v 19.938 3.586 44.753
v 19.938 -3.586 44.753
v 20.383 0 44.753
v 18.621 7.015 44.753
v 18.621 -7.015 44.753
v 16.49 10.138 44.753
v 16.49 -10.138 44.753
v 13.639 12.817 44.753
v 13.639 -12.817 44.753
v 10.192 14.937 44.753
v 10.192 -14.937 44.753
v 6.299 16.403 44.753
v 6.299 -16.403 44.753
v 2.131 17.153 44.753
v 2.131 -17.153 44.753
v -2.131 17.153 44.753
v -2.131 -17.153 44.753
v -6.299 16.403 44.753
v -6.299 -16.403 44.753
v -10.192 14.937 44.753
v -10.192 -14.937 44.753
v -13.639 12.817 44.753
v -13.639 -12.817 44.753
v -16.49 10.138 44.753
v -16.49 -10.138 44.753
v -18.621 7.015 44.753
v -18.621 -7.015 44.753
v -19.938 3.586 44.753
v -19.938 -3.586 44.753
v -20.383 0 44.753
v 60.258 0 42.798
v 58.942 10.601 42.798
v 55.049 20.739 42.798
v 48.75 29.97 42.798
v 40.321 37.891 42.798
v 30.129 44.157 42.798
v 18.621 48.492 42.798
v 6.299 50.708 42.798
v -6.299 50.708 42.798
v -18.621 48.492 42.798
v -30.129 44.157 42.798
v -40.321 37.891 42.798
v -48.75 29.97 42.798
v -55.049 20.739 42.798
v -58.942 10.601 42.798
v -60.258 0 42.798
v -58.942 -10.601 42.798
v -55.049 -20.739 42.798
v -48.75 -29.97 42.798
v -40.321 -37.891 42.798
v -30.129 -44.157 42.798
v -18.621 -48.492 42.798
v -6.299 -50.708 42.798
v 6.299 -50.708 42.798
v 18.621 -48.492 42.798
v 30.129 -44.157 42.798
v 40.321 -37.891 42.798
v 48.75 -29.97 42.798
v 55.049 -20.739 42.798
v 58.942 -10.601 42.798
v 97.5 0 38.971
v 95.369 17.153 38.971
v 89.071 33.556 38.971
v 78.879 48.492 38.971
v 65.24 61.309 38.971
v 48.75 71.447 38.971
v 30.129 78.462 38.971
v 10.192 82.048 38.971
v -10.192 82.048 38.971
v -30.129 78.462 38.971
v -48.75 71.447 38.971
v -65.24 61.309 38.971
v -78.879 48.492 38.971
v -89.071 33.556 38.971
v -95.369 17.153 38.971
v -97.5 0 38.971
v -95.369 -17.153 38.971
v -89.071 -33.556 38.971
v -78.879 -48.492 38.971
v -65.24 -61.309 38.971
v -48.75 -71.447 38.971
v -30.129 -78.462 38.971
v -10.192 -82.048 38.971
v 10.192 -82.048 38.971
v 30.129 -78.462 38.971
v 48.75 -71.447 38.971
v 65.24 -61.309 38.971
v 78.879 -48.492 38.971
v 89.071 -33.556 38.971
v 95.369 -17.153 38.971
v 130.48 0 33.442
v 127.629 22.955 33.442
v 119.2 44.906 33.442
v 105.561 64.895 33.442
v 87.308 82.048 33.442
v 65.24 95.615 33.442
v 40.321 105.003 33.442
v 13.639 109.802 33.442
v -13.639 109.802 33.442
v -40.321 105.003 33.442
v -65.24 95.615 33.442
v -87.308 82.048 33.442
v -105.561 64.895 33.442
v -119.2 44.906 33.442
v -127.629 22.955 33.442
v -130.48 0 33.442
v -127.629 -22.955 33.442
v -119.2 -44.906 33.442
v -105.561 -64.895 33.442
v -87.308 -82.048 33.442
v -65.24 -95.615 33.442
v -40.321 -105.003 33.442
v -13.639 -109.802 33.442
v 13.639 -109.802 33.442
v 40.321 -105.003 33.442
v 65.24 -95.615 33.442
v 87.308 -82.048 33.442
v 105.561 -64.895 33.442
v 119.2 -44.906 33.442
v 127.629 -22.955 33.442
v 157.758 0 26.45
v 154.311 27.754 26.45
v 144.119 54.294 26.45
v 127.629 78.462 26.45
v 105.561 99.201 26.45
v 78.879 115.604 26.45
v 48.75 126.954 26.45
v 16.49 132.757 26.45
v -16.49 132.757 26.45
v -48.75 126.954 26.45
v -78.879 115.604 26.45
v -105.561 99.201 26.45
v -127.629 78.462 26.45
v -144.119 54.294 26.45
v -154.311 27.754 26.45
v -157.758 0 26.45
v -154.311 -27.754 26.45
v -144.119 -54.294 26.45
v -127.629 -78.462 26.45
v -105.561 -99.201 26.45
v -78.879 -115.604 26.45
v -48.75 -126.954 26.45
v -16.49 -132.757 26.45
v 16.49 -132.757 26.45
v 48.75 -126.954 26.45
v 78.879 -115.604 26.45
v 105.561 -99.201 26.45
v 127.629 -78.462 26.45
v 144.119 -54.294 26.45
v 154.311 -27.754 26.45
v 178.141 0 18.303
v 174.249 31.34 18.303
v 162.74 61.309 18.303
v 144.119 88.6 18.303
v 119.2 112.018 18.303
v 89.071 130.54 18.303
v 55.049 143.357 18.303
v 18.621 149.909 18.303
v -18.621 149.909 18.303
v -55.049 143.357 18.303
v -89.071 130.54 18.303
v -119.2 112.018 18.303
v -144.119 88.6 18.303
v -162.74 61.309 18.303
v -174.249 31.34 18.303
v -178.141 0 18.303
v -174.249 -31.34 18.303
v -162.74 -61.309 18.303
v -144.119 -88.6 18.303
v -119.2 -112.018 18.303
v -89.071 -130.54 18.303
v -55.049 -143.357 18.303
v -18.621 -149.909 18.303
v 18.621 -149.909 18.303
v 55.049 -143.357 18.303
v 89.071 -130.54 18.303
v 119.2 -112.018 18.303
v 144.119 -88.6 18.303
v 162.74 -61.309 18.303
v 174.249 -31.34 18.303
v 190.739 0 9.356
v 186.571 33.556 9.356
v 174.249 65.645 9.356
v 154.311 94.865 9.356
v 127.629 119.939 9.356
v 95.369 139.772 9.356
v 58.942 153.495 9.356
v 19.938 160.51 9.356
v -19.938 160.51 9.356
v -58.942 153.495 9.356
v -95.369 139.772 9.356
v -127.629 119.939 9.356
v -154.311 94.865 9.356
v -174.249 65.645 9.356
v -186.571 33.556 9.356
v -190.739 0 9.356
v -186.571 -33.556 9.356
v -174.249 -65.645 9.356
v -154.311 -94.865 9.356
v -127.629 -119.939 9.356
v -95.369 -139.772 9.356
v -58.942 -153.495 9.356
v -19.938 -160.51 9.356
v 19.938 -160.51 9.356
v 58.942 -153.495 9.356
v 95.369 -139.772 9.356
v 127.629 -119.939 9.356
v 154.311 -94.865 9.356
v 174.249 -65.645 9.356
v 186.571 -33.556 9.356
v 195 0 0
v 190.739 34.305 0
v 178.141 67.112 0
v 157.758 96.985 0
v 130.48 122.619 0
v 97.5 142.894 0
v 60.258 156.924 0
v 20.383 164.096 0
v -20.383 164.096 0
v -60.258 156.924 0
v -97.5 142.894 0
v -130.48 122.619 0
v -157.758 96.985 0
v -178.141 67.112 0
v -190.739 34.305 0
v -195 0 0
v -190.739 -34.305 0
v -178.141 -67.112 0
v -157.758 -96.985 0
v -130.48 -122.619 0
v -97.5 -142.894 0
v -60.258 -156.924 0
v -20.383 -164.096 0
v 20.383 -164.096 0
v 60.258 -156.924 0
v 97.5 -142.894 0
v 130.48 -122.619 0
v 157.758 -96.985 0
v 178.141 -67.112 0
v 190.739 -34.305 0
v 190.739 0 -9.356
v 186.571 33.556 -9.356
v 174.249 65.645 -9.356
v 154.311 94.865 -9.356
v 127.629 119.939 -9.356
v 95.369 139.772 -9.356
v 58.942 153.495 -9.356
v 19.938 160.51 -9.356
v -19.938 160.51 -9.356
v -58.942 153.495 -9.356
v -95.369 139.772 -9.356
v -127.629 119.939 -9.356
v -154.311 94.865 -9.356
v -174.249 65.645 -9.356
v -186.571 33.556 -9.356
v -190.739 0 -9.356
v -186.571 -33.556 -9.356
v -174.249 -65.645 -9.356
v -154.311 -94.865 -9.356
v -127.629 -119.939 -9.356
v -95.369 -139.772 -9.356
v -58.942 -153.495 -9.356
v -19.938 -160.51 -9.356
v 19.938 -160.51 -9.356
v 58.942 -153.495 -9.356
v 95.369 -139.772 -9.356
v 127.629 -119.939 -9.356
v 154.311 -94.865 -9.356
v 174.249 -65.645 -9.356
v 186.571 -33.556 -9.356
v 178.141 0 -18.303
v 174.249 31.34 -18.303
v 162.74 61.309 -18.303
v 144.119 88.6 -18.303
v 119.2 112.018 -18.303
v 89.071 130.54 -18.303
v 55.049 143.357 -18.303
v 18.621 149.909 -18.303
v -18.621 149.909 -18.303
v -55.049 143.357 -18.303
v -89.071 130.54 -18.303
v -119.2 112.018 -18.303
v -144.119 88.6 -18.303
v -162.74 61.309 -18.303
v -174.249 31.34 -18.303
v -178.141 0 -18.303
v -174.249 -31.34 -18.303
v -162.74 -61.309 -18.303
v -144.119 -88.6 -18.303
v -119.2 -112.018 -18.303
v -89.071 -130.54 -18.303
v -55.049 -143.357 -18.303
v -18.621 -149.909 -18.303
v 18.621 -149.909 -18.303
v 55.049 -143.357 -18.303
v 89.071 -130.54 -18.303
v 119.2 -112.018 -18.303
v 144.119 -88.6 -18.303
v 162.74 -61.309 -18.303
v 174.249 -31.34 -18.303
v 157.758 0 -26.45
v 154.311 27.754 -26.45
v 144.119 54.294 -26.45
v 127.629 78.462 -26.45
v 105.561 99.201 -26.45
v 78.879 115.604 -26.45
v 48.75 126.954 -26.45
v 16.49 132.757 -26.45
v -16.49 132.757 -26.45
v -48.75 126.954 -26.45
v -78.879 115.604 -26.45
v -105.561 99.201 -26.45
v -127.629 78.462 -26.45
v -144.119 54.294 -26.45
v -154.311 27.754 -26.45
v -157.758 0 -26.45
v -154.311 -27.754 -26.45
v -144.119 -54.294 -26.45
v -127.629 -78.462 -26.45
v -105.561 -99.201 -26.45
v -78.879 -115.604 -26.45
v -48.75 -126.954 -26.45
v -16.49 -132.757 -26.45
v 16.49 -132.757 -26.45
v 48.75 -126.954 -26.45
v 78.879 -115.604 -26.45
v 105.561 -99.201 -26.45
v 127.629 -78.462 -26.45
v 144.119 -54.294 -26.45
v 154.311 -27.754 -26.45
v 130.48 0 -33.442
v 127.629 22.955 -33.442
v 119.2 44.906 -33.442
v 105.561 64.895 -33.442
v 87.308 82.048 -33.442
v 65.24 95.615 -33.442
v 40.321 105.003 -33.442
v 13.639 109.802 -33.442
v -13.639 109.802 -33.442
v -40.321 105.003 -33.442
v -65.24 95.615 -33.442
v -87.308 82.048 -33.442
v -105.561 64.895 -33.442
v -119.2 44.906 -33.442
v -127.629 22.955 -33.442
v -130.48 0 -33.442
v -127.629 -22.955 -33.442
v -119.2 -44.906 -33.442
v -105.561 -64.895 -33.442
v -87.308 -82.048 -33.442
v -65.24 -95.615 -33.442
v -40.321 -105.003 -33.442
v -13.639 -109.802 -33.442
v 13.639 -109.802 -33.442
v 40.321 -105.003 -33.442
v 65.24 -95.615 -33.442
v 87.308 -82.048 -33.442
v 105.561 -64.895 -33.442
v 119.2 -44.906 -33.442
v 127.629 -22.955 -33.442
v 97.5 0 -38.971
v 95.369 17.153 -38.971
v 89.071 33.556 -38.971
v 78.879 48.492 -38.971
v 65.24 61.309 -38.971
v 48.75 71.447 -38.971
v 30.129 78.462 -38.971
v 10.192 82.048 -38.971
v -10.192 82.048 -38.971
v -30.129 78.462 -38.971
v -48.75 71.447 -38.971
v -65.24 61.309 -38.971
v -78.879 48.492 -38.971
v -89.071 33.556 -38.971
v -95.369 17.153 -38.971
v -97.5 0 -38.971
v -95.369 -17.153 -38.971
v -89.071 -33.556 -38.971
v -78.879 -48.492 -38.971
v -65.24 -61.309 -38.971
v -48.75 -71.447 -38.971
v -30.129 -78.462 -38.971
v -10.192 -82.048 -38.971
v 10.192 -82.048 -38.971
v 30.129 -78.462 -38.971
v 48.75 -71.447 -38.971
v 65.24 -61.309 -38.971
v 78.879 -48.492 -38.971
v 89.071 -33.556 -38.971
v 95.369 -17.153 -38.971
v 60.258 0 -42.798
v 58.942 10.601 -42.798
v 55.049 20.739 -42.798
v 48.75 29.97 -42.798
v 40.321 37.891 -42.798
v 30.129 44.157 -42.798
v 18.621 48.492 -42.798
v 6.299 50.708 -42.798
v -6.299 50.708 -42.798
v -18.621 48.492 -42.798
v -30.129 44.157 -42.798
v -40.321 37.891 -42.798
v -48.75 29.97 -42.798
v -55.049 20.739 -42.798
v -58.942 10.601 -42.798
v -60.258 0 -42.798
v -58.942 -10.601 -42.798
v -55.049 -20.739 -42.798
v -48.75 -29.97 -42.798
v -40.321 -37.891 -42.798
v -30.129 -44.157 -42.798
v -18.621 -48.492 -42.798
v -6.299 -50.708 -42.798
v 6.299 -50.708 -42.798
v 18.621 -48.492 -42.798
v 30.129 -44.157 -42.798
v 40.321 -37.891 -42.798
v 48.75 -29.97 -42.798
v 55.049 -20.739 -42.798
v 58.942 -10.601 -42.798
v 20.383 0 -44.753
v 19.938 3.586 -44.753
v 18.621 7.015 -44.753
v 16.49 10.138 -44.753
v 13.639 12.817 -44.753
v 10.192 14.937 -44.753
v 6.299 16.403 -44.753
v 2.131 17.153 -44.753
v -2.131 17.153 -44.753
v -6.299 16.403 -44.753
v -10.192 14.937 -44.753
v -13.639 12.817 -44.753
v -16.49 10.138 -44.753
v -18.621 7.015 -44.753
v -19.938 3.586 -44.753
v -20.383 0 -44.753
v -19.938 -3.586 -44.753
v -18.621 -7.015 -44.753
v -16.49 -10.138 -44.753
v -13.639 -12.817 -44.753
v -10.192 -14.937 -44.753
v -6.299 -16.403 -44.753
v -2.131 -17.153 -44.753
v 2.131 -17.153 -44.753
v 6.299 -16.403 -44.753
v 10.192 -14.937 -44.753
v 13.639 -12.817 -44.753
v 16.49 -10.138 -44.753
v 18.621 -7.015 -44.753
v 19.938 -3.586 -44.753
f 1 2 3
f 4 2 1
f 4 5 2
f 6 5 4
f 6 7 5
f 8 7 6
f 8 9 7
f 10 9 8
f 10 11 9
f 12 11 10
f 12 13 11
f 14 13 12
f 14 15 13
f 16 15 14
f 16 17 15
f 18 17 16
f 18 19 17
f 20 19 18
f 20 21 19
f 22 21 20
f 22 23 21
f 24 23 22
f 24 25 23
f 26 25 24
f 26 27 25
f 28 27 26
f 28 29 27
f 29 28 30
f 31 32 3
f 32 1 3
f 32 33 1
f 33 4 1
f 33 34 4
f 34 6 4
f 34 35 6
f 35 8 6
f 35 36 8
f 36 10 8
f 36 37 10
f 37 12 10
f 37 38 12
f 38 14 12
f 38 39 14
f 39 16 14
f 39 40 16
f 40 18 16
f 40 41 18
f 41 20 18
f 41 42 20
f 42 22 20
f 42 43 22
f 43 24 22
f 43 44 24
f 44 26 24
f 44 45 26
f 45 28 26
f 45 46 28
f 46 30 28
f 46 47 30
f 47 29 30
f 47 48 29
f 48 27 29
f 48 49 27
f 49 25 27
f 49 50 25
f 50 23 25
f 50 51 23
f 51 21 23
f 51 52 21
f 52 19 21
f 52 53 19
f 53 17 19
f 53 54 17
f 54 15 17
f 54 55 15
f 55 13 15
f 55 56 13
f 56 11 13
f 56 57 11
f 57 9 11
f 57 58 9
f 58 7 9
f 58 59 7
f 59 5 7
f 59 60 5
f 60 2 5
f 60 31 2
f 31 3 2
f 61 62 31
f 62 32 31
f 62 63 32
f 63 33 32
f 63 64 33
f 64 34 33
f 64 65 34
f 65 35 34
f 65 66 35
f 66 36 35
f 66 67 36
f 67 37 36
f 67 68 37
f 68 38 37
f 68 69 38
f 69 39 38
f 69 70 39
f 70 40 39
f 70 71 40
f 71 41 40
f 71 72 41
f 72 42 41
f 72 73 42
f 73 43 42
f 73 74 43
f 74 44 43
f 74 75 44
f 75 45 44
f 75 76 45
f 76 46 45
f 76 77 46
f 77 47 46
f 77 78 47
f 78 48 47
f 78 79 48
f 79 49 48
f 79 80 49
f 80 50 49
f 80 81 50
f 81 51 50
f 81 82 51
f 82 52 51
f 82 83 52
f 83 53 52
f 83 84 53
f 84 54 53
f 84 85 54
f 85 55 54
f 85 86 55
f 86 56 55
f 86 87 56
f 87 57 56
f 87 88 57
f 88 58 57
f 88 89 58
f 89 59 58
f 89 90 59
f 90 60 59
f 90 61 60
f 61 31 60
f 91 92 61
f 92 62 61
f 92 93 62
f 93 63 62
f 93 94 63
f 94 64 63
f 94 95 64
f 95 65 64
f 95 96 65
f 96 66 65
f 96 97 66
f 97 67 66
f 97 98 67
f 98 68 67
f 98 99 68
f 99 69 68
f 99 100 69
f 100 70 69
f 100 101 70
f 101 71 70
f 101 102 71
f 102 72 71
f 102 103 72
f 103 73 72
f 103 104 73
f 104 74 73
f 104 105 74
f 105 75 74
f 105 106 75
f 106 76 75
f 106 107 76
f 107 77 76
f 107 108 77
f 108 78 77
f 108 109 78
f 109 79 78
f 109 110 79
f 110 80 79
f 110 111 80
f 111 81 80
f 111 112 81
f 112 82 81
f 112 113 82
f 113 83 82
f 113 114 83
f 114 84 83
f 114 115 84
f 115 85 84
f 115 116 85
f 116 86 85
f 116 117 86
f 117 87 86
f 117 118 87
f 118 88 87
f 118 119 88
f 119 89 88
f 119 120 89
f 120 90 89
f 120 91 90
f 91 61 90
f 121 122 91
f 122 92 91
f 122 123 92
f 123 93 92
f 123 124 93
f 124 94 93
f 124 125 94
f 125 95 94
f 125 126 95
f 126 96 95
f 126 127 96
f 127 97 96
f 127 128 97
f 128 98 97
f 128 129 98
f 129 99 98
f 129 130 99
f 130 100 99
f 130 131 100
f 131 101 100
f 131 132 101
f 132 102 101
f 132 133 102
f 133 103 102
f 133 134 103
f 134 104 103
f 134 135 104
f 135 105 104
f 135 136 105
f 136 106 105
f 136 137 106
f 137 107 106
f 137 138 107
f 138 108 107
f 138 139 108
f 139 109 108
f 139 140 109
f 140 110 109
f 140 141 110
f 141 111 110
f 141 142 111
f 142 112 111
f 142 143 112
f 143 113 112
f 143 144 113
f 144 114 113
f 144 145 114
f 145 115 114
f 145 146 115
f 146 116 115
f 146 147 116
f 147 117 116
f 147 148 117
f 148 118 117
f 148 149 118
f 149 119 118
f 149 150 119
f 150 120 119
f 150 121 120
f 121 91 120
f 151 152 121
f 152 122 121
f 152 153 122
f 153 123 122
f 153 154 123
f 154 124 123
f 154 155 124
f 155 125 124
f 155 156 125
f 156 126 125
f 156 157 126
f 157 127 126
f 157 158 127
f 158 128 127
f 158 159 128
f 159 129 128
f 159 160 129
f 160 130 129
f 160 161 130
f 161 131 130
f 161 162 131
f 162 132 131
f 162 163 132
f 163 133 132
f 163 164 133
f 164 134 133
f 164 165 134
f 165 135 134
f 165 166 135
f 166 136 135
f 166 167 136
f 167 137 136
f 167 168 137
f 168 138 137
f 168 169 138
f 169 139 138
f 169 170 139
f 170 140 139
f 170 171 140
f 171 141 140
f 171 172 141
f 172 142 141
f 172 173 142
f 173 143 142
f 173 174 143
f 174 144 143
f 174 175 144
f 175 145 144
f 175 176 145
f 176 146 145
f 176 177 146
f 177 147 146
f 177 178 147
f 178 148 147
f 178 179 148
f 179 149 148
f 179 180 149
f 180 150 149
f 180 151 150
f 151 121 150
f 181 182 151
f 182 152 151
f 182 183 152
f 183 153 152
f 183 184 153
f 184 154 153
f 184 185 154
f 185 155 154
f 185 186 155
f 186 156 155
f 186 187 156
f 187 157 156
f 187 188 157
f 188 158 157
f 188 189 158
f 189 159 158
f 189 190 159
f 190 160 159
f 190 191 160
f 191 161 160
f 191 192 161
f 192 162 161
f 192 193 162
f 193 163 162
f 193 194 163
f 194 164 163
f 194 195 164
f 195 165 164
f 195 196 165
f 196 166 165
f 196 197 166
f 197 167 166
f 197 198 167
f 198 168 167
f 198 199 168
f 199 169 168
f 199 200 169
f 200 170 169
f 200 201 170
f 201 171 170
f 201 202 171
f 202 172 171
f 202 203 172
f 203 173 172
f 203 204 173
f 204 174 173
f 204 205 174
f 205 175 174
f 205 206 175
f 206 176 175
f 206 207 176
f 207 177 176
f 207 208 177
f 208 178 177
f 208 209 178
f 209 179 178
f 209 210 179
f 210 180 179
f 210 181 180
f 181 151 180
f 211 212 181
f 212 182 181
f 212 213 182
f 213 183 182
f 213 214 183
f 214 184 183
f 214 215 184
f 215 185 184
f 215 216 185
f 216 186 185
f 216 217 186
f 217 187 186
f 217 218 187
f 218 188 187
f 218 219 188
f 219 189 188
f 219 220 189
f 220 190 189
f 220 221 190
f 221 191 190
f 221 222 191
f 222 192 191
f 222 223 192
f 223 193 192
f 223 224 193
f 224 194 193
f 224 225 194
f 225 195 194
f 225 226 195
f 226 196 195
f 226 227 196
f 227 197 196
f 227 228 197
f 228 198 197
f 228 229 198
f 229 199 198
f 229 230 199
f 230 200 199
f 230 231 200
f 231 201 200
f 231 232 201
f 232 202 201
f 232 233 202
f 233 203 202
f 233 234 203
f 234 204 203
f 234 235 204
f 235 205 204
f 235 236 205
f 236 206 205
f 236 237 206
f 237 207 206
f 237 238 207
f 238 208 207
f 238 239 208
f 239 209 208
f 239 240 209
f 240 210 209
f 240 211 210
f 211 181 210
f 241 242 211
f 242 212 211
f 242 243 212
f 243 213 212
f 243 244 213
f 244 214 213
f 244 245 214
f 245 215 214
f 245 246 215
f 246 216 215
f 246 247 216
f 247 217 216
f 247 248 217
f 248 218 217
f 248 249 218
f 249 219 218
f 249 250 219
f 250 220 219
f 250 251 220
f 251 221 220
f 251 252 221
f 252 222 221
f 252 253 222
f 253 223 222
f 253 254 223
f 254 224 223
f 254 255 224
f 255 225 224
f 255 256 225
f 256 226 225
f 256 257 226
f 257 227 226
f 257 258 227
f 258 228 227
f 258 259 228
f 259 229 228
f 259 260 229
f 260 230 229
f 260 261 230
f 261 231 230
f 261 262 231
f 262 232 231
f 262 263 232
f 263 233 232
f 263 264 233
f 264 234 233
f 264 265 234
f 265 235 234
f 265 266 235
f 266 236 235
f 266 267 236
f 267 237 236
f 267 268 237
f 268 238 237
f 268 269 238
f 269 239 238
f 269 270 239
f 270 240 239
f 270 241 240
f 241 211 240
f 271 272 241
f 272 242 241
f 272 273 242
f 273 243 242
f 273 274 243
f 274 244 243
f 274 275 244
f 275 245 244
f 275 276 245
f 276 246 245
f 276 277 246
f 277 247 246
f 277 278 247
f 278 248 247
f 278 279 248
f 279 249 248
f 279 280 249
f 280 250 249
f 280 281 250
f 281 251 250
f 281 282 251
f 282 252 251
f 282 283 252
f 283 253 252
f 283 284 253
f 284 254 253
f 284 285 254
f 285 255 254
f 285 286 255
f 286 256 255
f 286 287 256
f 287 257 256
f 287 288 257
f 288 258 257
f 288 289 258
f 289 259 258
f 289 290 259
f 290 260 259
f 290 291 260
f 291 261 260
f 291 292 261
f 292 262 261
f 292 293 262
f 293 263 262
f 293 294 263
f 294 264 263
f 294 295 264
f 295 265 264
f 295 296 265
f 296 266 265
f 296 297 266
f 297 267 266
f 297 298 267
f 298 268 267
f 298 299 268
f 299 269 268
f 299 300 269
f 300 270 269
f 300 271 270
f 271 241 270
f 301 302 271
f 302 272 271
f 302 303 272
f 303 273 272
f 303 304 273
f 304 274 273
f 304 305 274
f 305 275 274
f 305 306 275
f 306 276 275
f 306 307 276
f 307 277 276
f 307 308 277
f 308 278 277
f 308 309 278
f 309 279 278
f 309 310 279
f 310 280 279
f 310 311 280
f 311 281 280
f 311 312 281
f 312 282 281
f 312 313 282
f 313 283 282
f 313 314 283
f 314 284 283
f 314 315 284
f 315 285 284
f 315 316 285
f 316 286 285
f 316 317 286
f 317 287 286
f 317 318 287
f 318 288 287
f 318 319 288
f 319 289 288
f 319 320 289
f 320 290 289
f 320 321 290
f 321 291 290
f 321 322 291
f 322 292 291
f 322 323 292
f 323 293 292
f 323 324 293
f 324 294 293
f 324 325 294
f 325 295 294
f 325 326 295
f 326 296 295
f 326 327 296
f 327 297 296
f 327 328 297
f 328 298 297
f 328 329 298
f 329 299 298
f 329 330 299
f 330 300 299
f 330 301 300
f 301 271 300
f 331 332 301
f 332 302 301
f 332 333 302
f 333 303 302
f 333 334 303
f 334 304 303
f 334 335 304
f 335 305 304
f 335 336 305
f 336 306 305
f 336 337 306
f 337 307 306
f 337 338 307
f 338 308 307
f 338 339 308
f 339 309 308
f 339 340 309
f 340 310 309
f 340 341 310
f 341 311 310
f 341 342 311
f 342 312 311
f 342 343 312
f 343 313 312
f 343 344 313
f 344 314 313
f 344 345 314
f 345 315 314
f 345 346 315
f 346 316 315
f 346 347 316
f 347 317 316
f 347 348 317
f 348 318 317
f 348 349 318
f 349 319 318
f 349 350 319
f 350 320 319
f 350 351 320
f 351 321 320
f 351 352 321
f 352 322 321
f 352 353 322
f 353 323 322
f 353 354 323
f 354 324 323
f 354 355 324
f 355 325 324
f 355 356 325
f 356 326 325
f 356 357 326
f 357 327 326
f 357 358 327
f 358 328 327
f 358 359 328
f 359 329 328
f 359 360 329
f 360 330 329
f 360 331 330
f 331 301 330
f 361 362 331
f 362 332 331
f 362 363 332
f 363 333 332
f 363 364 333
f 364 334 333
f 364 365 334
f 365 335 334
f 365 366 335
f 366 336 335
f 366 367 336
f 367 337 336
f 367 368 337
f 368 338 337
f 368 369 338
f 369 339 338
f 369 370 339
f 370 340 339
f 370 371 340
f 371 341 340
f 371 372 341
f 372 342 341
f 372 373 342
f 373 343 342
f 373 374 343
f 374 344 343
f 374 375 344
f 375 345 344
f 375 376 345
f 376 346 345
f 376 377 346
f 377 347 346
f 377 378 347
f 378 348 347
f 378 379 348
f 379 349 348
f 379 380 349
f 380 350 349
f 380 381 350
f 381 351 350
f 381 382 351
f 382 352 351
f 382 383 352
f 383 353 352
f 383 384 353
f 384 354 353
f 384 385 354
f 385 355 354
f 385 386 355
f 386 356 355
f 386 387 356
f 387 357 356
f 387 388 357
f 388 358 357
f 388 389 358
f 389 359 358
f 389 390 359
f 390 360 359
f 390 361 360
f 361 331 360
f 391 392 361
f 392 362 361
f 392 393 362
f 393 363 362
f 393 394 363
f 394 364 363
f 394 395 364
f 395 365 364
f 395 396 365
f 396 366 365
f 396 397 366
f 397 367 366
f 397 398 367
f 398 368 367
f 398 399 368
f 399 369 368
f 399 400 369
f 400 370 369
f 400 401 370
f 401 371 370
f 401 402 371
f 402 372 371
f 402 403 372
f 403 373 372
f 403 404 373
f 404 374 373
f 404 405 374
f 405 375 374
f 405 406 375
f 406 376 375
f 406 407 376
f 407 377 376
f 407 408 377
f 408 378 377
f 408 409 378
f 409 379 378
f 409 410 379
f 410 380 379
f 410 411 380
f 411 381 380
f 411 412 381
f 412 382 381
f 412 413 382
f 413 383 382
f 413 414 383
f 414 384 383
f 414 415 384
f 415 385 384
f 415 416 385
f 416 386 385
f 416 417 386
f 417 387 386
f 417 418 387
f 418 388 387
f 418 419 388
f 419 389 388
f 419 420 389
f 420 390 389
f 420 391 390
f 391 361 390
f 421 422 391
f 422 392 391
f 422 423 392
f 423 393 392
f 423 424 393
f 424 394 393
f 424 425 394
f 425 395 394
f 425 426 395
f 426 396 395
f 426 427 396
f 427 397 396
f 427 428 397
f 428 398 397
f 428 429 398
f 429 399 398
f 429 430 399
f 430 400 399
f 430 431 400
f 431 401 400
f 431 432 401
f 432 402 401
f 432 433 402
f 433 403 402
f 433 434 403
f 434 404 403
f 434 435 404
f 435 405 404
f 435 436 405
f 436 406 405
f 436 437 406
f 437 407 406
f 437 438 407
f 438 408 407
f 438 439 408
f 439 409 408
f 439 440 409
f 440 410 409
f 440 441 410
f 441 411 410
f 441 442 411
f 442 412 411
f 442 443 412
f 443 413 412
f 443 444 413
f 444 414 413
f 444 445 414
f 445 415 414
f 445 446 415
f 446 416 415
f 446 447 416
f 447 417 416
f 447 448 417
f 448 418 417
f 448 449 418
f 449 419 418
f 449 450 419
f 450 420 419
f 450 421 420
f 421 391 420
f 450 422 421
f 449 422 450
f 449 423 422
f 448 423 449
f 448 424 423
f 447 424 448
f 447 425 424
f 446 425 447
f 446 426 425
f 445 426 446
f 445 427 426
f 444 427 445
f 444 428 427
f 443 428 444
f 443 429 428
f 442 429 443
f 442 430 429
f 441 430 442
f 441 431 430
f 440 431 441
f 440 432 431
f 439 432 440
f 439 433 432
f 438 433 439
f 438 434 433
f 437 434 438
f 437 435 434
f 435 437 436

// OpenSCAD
// Generated by SolidPython 1.0.1 on 2020-07-29 00:46:50


scale(v = [13, 11, 3]) {
	sphere(r = 15);
}
/***********************************************
*********      SolidPython code:      **********
************************************************
 
# import packages: SolidPython
from solid import *
from solid.utils import *
from itertools import chain, combinations, permutations


class Resize:

    def __init__(self, scad_file):
        self.scad_file = scad_file
        #self.scad_file = import_scad(scad_file)
        # cone/cylinder param:
        self.r1 = 0
        self.r2 = 0
        self.h = 0
        # rectangular prism param:
        self.w = 0
        self.l = 0
        # ellipse param:
        self.r = 0

    # import OpenScad code (file name corresponds to shape)


    # classify shape + parameters
    def assign(self, param1, param2, param3):
        if self.scad_file == 'cone.scad':
            self.r1 = param1
            self.r2 = param2
            self.h = param3
        elif self.scad_file == 'cylinder.scad':
            self.r1 = param1
            self.r2 = param2
            self.h = param3
        elif self.scad_file == 'rectangularPrism.scad':
            self.h = param1
            self.l = param2
            self.w = param3
        else:
            self.r = param1
            self.h = param2

    # resize parameters
    def iterate(self):
        x = range(3, 20, 2)
        i = 1
        if self.scad_file == 'cone.scad':
            tempList = list(permutations(x, 2))
            for temp in tempList:
                param1 = temp[0]
                param2 = temp[1]
                filepath = 'produced_scad_files/' + 'cone' + str(param1) + '_' + str(param2) + '_' + '.scad'
                scad_render_to_file(cylinder(h=param1, r1=param2, r2=0), filepath)

        elif self.scad_file == 'cylinder.scad':
            tempList = list(permutations(x, 3))
            for temp in tempList:
                param1 = temp[0]
                param2 = temp[1]
                filepath = 'produced_scad_files/' + 'cylinder' + str(param1) + '_' + str(param2) + '_' + '.scad'
                scad_render_to_file(cylinder(h=param1, r1=param2, r2=param2), filepath)

        elif self.scad_file == 'rectangularPrism.scad':
            tempList = list(permutations(x, 3))
            for temp in tempList:
                param1 = temp[0]
                param2 = temp[1]
                param3 = temp[2]
                filepath = 'produced_scad_files/' + 'rectangularPrism' + str(param1) + '_' + str(param2) + '_' + str(
                    param3) + '.scad'
                scad_render_to_file(cube(size=(param1, param2, param3)), filepath)

        elif self.scad_file == 'ellipse.scad':
            tempList = list(permutations(x, 4))
            for temp in tempList:
                param1 = temp[0]
                param2 = temp[1]
                param3 = temp[2]
                param4 = temp[3]
                filepath = 'produced_scad_files/' + 'ellipse' + str(param1) + '_' + str(param2) + '_' + str(param3) + '_' + str(param4) + '.scad'
                scad_render_to_file(scale([param1, param2, param3])(sphere(r=param4)), filepath)

    def render_to_scadfile(self):
        scad_render_to_file(scad, 'example.scad') 
 
************************************************/
